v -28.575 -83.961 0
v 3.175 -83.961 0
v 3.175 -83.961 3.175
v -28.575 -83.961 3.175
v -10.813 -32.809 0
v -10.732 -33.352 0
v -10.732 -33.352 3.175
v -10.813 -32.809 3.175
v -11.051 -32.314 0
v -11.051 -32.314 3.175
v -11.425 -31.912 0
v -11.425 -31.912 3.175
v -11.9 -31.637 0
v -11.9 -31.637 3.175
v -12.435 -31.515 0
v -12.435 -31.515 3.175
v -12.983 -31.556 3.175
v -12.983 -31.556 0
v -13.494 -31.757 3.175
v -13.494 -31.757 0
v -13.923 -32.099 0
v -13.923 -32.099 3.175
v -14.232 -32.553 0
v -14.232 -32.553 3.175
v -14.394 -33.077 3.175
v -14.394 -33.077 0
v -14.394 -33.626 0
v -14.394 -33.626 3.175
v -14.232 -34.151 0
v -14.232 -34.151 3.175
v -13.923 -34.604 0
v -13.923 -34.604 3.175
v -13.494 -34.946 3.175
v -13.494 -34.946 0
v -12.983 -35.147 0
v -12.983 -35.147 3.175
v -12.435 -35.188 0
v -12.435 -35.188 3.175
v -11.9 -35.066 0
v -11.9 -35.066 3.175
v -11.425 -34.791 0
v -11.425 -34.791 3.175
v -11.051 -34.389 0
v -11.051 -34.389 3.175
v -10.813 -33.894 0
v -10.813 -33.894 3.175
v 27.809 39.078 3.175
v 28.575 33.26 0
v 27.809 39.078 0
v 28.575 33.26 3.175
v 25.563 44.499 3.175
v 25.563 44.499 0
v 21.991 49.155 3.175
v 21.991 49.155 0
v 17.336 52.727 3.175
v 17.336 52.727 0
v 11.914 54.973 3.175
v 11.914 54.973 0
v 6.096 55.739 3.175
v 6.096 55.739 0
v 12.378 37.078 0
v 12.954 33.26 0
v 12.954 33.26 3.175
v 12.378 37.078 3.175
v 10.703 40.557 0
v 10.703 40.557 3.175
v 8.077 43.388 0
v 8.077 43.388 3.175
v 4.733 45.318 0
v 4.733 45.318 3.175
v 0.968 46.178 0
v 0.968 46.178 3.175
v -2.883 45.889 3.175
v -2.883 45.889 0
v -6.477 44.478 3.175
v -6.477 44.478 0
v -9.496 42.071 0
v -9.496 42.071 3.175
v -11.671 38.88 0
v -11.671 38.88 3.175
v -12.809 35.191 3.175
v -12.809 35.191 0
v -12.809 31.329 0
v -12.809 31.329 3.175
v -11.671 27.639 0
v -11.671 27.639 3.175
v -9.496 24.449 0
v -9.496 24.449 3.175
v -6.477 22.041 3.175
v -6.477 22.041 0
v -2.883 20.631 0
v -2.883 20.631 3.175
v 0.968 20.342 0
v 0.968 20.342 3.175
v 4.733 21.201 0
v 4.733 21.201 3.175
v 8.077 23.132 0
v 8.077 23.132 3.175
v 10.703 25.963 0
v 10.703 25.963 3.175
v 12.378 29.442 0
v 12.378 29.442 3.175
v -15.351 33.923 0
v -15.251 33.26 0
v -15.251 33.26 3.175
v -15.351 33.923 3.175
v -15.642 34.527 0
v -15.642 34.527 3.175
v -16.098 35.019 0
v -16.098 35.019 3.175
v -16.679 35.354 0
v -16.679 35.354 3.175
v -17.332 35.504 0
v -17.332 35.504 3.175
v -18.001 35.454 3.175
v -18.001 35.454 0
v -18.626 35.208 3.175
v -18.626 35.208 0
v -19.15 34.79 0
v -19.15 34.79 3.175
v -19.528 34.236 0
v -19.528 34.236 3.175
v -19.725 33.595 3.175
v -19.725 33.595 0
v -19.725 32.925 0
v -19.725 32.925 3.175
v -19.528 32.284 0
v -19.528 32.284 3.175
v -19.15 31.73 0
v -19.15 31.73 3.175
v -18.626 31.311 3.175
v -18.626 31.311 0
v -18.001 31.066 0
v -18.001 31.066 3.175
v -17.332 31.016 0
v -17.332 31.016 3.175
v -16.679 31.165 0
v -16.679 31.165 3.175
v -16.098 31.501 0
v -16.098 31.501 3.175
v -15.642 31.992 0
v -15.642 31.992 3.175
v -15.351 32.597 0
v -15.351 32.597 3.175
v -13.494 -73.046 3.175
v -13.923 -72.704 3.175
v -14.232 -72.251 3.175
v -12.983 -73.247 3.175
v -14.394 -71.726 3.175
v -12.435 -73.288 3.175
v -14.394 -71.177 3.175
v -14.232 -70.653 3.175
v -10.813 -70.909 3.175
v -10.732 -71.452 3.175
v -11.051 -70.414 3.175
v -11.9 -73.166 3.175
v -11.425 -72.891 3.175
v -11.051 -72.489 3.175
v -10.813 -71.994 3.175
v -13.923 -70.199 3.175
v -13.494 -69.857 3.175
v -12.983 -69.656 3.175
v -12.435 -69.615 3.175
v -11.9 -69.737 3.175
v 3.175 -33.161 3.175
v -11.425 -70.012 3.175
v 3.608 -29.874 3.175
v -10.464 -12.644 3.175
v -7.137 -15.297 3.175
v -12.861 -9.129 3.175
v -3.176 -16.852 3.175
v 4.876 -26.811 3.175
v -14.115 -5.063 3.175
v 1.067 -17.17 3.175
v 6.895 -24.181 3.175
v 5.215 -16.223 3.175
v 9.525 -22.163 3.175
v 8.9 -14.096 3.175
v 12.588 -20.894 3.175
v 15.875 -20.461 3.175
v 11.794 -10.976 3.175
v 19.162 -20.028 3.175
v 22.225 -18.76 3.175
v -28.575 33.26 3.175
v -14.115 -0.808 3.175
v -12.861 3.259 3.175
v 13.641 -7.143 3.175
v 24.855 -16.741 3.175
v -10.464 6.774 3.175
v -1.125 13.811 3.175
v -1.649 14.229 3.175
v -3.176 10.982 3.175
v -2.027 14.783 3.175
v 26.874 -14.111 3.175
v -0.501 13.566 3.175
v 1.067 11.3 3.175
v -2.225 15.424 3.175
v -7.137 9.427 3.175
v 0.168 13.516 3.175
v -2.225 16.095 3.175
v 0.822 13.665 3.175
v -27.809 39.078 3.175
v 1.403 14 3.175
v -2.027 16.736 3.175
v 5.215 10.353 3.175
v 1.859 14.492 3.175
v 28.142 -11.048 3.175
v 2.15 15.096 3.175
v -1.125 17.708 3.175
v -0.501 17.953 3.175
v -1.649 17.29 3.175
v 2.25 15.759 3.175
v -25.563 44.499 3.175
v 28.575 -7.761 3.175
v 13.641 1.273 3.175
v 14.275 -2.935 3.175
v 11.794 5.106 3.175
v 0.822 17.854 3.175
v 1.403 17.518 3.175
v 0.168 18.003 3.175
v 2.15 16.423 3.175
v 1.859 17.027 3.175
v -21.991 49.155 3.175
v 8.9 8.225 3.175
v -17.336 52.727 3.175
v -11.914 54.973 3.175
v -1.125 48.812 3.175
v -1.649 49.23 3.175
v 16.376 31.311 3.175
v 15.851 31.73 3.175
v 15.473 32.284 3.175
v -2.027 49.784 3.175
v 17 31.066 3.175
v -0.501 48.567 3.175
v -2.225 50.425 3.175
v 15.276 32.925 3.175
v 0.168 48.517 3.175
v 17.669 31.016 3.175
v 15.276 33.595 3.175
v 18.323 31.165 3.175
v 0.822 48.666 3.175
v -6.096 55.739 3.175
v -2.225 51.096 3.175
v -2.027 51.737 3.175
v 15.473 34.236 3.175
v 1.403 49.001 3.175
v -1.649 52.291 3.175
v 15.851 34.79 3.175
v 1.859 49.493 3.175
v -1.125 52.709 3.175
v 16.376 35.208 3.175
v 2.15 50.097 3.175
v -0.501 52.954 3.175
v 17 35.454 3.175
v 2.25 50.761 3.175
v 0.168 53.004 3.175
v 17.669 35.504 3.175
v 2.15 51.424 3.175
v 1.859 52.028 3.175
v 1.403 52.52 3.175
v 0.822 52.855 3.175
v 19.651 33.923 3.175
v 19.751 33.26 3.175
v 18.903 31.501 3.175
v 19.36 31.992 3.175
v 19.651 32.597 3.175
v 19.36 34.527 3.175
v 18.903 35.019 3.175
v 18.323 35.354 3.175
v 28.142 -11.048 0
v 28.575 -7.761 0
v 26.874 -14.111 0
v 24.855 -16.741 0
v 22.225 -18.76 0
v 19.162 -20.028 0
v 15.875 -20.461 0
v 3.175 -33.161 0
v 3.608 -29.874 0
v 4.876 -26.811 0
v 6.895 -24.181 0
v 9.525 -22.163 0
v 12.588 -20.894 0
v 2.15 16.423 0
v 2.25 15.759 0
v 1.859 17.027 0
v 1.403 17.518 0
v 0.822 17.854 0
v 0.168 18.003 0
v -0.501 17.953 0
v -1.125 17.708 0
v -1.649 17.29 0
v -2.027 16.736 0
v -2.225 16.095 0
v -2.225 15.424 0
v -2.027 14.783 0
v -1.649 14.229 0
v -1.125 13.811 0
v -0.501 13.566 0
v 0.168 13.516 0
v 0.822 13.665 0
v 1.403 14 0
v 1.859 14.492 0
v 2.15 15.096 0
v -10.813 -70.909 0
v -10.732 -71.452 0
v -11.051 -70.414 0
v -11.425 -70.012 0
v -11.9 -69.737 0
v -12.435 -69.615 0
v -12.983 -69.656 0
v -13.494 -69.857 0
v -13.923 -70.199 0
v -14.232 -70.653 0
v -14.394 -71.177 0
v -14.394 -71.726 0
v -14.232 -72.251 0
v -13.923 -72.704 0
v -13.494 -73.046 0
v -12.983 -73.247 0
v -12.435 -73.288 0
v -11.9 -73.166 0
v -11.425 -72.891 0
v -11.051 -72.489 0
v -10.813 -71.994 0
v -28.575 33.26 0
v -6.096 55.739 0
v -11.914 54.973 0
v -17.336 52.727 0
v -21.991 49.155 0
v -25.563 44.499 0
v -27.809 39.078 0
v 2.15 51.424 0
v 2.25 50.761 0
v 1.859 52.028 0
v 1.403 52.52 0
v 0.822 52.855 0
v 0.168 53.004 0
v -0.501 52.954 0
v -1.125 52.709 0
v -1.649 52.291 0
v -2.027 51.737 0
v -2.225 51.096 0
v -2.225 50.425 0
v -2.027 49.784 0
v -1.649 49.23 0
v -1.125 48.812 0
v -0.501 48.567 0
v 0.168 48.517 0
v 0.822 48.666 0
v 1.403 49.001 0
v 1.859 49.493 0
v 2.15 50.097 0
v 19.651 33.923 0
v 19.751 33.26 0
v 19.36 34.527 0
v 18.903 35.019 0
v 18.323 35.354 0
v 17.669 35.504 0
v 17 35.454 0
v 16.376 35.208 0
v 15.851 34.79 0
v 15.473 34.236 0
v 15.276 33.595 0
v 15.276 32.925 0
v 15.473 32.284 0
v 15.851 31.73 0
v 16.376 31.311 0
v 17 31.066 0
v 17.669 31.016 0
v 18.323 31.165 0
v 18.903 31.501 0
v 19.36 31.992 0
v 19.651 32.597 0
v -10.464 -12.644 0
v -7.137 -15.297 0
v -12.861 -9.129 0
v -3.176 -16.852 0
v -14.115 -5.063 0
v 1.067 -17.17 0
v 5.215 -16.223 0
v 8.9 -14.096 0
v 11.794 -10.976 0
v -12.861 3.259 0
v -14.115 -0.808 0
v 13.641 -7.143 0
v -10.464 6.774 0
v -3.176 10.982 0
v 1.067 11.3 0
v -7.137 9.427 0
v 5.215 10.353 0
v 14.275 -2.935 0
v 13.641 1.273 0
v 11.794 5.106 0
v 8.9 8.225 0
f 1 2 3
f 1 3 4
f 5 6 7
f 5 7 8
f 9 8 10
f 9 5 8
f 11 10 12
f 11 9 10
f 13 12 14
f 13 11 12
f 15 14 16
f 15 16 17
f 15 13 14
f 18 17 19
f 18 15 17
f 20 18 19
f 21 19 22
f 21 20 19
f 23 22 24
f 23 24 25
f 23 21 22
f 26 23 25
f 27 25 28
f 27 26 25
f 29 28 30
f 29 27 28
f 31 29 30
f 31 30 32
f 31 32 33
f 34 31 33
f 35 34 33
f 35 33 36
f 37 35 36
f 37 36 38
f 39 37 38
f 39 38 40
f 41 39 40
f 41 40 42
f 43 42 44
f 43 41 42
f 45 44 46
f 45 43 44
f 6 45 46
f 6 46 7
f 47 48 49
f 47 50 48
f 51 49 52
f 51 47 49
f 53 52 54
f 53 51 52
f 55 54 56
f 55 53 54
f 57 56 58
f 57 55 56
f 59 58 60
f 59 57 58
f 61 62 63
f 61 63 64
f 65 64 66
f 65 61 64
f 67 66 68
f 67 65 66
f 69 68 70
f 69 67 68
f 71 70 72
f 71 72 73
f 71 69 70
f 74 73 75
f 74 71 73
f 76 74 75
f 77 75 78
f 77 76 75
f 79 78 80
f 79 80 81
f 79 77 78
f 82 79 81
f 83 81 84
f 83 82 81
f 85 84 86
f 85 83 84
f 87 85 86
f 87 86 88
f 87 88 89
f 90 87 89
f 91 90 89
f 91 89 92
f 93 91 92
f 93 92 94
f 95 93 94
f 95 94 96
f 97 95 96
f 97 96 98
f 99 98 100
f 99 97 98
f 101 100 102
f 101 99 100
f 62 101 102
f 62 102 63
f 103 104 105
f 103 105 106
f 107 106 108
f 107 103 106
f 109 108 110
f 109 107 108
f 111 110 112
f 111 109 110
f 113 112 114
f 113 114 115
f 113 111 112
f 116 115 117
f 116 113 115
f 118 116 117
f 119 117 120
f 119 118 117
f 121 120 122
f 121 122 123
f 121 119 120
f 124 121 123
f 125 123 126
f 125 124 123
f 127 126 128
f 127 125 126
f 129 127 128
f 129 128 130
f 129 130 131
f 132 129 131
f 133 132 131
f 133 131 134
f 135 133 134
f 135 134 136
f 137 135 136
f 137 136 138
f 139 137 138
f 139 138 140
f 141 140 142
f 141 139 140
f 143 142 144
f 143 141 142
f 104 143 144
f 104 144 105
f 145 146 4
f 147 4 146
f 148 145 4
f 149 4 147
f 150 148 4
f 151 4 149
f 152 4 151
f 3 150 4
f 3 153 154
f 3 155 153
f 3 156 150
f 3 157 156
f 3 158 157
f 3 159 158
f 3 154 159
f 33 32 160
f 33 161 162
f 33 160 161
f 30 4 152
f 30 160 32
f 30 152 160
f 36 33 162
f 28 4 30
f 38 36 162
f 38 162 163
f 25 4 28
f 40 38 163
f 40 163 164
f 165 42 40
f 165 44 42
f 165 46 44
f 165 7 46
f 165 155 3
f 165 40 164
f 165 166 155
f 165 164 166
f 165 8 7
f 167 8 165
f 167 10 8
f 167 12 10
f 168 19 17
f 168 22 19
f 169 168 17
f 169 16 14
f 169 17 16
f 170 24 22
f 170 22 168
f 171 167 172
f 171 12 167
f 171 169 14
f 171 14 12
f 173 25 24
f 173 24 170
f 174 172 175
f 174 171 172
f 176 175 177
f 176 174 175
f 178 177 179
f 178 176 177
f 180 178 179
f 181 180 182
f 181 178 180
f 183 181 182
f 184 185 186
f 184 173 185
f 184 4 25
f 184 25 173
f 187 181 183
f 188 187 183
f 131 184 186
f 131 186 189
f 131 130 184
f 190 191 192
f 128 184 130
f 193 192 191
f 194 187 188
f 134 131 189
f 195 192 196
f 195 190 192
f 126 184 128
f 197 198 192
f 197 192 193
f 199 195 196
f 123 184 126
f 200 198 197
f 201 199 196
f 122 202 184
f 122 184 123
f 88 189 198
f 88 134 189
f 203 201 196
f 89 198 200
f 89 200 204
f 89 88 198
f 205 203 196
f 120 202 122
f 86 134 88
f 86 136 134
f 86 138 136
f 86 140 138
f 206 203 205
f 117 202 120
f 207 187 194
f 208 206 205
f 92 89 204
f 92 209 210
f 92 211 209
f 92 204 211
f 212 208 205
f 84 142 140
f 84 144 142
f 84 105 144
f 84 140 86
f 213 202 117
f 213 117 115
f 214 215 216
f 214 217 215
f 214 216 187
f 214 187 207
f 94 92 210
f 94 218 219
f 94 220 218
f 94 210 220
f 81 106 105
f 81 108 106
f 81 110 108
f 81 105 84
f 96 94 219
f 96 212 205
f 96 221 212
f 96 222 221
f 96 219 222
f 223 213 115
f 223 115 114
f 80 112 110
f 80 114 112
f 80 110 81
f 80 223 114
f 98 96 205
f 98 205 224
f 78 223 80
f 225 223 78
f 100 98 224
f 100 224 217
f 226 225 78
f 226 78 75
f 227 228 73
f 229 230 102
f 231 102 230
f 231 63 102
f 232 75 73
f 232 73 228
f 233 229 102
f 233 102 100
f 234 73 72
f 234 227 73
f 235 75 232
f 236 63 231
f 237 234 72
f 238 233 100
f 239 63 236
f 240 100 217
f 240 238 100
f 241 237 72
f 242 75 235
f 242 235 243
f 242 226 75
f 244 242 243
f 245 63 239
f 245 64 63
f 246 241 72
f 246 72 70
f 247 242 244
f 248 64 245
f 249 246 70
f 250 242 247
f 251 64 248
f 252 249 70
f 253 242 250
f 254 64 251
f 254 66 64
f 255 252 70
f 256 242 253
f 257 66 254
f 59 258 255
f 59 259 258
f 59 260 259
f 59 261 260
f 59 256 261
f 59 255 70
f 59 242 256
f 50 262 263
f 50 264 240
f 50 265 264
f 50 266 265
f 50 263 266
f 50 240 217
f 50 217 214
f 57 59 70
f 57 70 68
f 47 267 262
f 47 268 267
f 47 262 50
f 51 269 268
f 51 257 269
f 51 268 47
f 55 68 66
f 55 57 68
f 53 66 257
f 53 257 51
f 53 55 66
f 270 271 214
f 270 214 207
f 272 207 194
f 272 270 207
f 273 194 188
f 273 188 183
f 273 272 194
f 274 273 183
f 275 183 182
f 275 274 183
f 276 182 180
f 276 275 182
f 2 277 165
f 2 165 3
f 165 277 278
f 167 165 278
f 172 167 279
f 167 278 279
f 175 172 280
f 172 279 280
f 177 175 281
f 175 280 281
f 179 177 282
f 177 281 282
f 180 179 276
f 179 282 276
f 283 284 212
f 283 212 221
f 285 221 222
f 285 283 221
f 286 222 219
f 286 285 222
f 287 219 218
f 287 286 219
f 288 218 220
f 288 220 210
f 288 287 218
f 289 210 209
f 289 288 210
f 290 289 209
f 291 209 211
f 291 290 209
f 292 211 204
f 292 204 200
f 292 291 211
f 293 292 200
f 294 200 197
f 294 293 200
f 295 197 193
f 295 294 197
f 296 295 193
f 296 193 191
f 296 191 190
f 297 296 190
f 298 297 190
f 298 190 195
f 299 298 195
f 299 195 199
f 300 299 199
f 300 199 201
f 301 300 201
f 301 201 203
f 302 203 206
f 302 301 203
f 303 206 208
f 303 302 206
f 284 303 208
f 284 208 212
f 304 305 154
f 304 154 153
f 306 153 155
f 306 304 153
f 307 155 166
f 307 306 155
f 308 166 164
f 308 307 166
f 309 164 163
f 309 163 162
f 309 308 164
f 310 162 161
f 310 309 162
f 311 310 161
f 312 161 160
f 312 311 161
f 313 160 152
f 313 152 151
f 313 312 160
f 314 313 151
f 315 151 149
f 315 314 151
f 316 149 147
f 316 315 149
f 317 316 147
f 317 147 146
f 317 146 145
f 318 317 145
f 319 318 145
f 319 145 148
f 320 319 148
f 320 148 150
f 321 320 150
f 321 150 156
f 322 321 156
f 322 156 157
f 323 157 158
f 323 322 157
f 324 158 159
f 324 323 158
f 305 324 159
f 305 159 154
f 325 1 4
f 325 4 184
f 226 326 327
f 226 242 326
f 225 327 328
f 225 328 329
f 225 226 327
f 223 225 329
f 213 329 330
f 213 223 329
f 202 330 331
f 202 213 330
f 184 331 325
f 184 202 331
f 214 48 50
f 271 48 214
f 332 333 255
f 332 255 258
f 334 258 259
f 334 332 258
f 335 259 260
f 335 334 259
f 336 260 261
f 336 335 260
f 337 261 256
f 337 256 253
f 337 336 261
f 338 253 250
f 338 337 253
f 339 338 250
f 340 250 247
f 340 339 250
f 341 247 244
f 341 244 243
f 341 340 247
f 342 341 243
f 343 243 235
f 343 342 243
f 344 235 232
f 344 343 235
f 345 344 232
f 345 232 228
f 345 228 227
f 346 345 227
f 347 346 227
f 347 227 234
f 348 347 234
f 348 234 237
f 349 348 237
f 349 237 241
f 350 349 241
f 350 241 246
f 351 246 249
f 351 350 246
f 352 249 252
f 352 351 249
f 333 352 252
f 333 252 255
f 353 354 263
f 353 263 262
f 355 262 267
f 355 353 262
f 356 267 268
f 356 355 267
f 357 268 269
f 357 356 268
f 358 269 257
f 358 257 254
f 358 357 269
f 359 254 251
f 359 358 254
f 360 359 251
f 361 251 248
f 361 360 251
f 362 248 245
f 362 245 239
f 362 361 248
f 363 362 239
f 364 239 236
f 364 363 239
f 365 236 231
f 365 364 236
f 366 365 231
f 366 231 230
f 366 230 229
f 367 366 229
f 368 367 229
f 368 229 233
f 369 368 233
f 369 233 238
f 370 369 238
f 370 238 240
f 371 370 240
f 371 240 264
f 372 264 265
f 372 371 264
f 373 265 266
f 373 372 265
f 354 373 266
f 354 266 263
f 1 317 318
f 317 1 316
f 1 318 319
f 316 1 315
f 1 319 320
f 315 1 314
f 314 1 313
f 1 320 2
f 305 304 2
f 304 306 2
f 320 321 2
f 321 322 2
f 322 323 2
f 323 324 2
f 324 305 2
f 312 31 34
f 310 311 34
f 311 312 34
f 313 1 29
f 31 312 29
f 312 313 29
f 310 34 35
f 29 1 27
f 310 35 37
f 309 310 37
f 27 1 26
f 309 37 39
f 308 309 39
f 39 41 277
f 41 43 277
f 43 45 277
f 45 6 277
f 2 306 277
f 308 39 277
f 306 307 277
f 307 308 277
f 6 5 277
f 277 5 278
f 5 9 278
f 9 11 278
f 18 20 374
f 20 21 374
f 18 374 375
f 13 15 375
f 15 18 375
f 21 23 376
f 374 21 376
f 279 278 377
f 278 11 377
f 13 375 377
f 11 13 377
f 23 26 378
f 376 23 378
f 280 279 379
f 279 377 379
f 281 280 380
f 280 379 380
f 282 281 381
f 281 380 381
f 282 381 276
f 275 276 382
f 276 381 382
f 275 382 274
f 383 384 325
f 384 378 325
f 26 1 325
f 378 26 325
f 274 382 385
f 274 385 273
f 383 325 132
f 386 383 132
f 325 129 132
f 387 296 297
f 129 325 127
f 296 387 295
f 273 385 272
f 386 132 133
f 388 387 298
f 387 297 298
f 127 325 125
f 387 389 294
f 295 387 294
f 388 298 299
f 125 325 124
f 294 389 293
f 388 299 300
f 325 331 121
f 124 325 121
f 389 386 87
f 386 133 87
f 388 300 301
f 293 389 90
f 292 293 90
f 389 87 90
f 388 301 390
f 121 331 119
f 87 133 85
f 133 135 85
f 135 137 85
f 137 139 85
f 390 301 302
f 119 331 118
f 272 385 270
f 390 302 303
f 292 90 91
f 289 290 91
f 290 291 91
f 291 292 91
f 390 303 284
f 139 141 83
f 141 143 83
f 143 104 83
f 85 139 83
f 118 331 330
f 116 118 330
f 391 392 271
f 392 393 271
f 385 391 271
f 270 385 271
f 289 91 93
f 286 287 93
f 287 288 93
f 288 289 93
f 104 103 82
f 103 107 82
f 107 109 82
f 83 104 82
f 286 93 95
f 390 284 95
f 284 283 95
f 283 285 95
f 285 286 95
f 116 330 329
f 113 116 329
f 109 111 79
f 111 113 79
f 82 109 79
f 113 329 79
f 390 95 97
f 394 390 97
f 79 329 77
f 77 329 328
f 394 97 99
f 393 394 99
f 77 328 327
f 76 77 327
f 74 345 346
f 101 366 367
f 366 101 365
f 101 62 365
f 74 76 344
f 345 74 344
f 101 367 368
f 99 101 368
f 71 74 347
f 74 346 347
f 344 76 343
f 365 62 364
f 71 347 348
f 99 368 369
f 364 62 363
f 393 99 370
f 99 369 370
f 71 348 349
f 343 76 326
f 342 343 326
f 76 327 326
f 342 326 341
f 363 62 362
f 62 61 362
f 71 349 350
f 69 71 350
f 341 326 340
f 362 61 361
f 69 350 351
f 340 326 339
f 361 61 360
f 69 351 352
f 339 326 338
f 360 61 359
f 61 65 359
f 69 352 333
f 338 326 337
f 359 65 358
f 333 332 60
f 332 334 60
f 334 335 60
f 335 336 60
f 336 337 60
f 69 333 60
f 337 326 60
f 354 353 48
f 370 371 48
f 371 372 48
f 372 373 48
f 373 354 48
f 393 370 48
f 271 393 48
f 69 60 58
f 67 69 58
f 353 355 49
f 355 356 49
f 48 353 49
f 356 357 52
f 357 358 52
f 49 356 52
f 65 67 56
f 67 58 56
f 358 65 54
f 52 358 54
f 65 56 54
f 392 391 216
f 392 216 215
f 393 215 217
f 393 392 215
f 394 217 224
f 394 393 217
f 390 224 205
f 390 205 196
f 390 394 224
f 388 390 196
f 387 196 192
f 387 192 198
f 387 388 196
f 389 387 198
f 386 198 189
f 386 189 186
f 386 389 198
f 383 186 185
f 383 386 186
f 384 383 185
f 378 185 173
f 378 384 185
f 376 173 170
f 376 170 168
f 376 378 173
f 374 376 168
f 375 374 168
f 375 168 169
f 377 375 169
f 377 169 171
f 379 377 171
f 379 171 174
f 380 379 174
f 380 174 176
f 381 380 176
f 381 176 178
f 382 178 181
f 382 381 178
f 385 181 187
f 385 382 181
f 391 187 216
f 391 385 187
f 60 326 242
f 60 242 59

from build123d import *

# Parameters (mm, degrees)
SKETCH1_R           = 12.954
SKETCH1_R_2         = 2.25
SKETCH1_R_3         = 14.2748
SKETCH1_R_4         = 1.8415
BOSS_EXTRUDE1_DEPTH = 3.175
FILLET1_R           = 22.479
FILLET2_START       = -1
FILLET2_DEPTH       = 5
FILLET2_2_DEPTH     = 3.175


with BuildPart() as part:
    # Sketch1 → Boss-Extrude1 (new body)
    with BuildSketch(Plane.XY):
        Polygon((28.575, -20.461058414), (3.175, -20.461058414), (3.175, -83.961058414), (-28.575, -83.961058414), (-28.575, 55.738941586), (28.575, 55.738941586), align=None)
        with Locations((0, 33.259941586)):
            Circle(SKETCH1_R, mode=Mode.SUBTRACT)
        with Locations((0, 50.760541586)):
            Circle(SKETCH1_R_2, mode=Mode.SUBTRACT)
        with Locations((17.5006, 33.259941586)):
            Circle(SKETCH1_R_2, mode=Mode.SUBTRACT)
        with Locations((0, 15.759341586)):
            Circle(SKETCH1_R_2, mode=Mode.SUBTRACT)
        with Locations((-17.5006, 33.259941586)):
            Circle(SKETCH1_R_2, mode=Mode.SUBTRACT)
        with Locations((0, -2.935058414)):
            Circle(SKETCH1_R_3, mode=Mode.SUBTRACT)
        with Locations((-12.573, -33.351558414)):
            Circle(SKETCH1_R_4, mode=Mode.SUBTRACT)
        with Locations((-12.573, -71.451558414)):
            Circle(SKETCH1_R_4, mode=Mode.SUBTRACT)
    extrude(amount=BOSS_EXTRUDE1_DEPTH)

    # Fillet1
    fillet1_edges = [part.edges().sort_by_distance(p)[0] for p in [
        (-28.575, 55.738941586, 1.5875),
        (28.575, 55.738941586, 1.5875),
    ]]
    fillet(fillet1_edges, radius=FILLET1_R)

    # Fillet2: read off the stored shape, not the designer's step
    # Fillet2 outline → Fillet2 (cut)
    with BuildSketch(Plane.XY.offset(FILLET2_START)):
        with BuildLine():
            ThreePointArc((28.575, -7.761058414), (24.855256121, -16.741314535), (15.875, -20.461058414))
            Line((15.875, -20.461058414), (28.575, -20.461058414))
            Line((28.575, -20.461058414), (28.575, -7.761058414))
        make_face()
    extrude(amount=FILLET2_DEPTH, mode=Mode.SUBTRACT)

    # Fillet2 2 outline → Fillet2 2 (add)
    with BuildSketch(Plane.XY):
        with BuildLine():
            ThreePointArc((3.175, -33.161058414), (6.894743879, -24.180802293), (15.875, -20.461058414))
            Line((15.875, -20.461058414), (3.175, -20.461058414))
            Line((3.175, -20.461058414), (3.175, -33.161058414))
        make_face()
    extrude(amount=FILLET2_2_DEPTH)


solid = part.part
